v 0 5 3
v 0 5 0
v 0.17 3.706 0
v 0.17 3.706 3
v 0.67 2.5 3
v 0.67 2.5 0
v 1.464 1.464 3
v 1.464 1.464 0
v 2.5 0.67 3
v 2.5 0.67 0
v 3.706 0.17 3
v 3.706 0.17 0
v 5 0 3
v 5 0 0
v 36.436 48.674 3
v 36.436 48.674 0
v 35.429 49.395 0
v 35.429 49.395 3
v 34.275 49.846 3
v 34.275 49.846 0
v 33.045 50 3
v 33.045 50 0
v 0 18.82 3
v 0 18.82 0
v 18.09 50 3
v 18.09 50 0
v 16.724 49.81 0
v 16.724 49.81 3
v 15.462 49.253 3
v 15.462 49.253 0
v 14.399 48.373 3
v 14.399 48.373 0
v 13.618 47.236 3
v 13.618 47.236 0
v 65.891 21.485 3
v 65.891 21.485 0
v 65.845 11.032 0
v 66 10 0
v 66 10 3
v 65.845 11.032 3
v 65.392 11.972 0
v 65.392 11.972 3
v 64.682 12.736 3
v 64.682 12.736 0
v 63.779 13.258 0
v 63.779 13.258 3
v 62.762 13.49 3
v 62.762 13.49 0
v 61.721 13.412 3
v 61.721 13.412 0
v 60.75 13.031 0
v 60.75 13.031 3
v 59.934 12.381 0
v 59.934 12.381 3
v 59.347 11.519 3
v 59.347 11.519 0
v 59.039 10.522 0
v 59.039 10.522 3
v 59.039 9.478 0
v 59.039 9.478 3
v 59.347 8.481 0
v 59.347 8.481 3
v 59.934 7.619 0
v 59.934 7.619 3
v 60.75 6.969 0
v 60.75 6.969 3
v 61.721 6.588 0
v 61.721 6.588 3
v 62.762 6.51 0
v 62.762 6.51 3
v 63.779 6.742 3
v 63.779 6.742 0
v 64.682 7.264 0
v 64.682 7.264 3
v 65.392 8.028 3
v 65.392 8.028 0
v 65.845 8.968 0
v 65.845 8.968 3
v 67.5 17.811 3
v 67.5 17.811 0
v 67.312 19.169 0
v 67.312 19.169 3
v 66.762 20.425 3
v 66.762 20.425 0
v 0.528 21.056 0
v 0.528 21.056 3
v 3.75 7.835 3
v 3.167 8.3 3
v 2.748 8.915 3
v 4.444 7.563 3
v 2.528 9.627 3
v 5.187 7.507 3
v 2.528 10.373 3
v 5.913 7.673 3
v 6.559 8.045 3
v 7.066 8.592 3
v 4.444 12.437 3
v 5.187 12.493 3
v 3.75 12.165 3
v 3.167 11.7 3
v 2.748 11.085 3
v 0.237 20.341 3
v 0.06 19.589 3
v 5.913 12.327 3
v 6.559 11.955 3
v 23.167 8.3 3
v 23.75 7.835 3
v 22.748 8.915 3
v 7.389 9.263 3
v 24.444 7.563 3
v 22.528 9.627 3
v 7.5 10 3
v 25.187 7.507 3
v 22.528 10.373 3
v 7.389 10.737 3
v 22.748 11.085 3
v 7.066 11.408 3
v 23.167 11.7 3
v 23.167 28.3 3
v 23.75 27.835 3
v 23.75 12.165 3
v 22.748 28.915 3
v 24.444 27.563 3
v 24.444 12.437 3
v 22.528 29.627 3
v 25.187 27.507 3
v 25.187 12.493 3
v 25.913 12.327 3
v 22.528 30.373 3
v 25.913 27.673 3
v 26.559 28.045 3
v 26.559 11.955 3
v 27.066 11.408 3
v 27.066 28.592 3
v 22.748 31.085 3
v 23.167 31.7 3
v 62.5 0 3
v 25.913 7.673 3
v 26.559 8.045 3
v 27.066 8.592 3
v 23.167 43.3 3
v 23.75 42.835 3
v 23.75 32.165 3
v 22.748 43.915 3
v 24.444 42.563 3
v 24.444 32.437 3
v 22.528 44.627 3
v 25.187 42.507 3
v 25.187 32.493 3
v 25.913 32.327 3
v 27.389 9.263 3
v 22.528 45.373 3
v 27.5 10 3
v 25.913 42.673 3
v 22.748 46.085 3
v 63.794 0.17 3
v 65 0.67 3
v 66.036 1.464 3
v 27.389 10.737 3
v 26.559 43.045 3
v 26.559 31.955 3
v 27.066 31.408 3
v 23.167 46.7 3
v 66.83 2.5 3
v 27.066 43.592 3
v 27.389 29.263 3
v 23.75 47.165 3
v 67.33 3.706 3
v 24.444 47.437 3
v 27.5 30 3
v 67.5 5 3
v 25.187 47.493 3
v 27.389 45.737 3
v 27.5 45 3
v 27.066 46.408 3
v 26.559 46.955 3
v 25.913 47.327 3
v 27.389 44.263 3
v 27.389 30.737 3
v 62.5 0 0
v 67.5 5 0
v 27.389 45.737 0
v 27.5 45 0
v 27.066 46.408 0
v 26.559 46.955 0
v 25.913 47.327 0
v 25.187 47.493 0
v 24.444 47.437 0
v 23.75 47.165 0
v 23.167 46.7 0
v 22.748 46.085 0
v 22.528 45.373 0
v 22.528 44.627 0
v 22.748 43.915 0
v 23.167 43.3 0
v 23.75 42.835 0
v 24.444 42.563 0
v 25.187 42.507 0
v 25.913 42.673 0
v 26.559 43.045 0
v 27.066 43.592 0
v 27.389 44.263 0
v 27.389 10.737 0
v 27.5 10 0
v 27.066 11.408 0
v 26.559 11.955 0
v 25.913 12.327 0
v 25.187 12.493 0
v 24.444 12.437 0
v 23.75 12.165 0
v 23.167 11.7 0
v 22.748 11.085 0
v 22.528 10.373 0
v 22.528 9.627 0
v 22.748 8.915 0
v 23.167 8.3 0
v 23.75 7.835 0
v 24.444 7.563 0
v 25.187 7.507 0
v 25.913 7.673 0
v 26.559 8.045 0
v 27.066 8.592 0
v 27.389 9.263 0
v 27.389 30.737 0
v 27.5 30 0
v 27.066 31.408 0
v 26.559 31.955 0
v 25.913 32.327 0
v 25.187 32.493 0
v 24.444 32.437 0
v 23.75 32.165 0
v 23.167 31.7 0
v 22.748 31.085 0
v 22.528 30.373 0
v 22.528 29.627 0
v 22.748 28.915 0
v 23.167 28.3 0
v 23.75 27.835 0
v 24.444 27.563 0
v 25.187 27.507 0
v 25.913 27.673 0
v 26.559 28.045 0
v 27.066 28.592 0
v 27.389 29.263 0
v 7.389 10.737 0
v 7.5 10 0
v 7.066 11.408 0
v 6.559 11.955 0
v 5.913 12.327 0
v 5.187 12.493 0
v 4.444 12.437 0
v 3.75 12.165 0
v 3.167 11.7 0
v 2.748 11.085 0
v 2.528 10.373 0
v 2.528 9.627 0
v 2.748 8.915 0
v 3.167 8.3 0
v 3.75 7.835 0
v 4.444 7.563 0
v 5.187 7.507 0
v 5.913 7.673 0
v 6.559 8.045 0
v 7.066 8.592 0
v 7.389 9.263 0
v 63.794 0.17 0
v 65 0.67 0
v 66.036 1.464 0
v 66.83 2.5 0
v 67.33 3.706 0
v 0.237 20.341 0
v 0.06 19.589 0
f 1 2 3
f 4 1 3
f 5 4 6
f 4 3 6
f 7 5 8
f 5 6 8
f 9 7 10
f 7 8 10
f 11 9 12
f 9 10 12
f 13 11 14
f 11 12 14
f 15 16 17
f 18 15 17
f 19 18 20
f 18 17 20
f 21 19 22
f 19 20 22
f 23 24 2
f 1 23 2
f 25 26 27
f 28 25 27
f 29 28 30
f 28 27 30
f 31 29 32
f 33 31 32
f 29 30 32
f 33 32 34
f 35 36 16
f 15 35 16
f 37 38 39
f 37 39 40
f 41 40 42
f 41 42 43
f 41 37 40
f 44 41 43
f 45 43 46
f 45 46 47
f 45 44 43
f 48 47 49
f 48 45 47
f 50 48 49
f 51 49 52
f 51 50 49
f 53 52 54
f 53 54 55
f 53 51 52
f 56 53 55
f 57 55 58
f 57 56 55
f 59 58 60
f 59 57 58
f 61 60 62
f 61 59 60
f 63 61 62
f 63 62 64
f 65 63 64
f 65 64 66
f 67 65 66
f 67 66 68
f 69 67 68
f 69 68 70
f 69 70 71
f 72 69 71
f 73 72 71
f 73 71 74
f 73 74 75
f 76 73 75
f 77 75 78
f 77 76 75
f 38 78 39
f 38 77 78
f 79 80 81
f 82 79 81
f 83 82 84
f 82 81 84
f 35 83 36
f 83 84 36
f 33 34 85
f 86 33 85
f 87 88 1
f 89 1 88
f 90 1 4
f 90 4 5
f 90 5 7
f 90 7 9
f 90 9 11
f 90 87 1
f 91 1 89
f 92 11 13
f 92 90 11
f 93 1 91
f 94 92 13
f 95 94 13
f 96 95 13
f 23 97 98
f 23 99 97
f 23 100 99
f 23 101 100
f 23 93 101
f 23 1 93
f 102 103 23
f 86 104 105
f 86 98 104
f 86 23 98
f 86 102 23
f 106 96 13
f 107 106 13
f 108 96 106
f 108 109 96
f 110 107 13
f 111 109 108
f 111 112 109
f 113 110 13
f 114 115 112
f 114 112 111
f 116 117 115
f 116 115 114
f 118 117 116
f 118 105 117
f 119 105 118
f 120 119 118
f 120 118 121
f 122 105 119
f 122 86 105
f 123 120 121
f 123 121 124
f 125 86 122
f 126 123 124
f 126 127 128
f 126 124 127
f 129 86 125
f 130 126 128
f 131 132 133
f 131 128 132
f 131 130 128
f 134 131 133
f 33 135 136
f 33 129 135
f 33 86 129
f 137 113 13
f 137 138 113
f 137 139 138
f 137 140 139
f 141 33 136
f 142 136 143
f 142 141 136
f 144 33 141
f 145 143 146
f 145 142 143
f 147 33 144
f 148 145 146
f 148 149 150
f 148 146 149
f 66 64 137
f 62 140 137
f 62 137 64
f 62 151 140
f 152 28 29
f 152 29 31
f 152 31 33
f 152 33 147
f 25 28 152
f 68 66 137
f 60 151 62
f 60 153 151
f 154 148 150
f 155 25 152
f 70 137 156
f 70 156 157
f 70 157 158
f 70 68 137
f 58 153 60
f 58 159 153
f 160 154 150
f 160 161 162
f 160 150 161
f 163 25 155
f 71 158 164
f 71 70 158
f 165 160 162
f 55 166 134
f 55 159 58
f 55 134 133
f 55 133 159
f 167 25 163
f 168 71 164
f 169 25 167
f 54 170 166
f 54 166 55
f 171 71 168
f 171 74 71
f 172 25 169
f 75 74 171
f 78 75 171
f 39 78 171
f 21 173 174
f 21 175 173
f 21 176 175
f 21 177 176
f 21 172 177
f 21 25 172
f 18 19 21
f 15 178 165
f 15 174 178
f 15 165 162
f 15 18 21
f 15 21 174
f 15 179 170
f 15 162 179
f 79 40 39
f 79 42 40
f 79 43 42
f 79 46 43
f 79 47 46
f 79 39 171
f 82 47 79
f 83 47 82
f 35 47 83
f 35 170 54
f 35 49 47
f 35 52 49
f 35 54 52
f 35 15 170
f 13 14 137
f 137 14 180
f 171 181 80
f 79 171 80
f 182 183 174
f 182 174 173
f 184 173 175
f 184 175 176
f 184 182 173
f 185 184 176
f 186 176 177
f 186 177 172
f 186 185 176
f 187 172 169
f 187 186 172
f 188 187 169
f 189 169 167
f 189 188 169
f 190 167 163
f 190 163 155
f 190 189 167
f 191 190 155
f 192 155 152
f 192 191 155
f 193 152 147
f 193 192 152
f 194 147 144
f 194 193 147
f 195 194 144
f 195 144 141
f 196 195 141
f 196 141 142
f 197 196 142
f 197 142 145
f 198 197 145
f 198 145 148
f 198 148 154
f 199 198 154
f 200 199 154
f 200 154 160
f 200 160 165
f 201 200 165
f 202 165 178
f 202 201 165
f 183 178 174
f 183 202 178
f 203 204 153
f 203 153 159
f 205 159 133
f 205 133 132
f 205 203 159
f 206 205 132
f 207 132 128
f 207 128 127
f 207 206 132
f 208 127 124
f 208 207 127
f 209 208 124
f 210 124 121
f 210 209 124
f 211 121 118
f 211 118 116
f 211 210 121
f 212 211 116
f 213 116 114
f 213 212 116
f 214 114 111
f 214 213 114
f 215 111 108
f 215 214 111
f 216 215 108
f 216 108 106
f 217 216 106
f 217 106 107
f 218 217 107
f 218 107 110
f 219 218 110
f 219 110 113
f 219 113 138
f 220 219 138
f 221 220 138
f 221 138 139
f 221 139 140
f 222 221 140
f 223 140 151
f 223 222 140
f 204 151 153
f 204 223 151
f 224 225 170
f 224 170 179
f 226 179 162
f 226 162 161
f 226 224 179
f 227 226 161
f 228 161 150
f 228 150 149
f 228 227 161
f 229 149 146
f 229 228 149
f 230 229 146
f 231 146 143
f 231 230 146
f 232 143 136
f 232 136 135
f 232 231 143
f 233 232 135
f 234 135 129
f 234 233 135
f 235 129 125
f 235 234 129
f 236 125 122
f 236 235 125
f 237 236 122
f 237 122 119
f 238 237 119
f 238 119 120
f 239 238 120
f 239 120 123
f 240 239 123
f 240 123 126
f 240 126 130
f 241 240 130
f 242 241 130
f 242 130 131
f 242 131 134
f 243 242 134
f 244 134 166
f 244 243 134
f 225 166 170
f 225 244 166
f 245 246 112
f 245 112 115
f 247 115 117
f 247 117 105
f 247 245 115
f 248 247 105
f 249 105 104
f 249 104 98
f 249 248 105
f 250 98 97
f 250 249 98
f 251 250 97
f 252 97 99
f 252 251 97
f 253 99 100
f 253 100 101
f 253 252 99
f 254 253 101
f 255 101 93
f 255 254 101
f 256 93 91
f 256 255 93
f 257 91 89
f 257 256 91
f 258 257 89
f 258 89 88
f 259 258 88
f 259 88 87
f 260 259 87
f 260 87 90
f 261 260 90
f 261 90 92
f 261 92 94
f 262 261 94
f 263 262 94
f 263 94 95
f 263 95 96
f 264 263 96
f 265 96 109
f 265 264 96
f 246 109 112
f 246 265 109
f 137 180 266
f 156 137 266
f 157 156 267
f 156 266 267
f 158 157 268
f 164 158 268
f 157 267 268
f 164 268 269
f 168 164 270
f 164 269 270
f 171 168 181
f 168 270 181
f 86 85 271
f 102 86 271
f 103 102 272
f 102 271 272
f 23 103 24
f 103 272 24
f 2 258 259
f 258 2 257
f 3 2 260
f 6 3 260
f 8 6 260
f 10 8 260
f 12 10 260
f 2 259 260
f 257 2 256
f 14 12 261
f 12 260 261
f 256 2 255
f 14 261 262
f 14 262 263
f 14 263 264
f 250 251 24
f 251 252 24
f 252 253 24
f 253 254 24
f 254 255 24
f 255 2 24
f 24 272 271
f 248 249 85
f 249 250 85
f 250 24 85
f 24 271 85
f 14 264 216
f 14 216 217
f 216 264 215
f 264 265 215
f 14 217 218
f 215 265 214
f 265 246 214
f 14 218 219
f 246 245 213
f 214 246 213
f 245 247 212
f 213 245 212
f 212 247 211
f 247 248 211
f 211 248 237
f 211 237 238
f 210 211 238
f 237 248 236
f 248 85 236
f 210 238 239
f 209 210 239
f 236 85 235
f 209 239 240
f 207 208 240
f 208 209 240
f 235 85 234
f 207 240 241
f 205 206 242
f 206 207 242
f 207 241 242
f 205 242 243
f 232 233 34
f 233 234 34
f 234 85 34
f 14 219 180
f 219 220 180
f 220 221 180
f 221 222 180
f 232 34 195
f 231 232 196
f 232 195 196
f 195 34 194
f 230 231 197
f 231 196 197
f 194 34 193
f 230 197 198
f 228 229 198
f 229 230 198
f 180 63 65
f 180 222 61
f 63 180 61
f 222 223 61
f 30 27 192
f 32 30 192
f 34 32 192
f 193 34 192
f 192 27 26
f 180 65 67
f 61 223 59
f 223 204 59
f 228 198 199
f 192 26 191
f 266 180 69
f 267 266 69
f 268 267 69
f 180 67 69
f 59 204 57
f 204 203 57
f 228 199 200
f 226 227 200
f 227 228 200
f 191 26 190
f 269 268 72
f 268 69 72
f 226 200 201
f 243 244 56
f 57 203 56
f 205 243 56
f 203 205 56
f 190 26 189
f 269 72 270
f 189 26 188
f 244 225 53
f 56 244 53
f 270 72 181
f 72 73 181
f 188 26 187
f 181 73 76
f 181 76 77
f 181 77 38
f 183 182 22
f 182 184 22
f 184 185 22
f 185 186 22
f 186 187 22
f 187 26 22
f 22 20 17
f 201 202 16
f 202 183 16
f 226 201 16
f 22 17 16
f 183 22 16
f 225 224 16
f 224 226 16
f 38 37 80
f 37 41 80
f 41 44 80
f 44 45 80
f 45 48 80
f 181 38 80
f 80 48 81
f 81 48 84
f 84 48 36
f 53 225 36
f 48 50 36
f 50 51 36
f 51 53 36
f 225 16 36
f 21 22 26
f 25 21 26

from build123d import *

# Parameters (mm, degrees)
F0_R     = 2.5
F0_R_2   = 3.5
F1_DEPTH = 3


with BuildPart() as f1:
    # F0 (on Top) → F1 (new body)
    with BuildSketch(Plane.XY):
        with BuildLine():
            Line((0, 18.81966), (0, 5))
            ThreePointArc((0, 5), (1.464466, 1.464466), (5, 0))
            Line((5, 0), (62.5, 0))
            ThreePointArc((62.5, 0), (66.035534, 1.464466), (67.5, 5))
            Line((67.5, 5), (67.5, 17.810844))
            ThreePointArc((67.5, 17.810844), (67.080229, 19.816211), (65.891401, 21.484861))
            Line((65.891401, 21.484861), (36.436481, 48.674017))
            ThreePointArc((36.436481, 48.674017), (34.865783, 49.65672), (33.045081, 50))
            Line((33.045081, 50), (18.09017, 50))
            ThreePointArc((18.09017, 50), (15.461514, 49.253254), (13.618034, 47.236068))
            Line((13.618034, 47.236068), (0.527864, 21.055728))
            ThreePointArc((0.527864, 21.055728), (0.133755, 19.968425), (0, 18.81966))
        make_face()
        with Locations((5, 10)):
            Circle(F0_R, mode=Mode.SUBTRACT)
        with Locations((25, 10)):
            Circle(F0_R, mode=Mode.SUBTRACT)
        with Locations((62.5, 10)):
            Circle(F0_R_2, mode=Mode.SUBTRACT)
        with Locations((25, 30)):
            Circle(F0_R, mode=Mode.SUBTRACT)
        with Locations((25, 45)):
            Circle(F0_R, mode=Mode.SUBTRACT)
    extrude(amount=F1_DEPTH)


solid = f1.part
